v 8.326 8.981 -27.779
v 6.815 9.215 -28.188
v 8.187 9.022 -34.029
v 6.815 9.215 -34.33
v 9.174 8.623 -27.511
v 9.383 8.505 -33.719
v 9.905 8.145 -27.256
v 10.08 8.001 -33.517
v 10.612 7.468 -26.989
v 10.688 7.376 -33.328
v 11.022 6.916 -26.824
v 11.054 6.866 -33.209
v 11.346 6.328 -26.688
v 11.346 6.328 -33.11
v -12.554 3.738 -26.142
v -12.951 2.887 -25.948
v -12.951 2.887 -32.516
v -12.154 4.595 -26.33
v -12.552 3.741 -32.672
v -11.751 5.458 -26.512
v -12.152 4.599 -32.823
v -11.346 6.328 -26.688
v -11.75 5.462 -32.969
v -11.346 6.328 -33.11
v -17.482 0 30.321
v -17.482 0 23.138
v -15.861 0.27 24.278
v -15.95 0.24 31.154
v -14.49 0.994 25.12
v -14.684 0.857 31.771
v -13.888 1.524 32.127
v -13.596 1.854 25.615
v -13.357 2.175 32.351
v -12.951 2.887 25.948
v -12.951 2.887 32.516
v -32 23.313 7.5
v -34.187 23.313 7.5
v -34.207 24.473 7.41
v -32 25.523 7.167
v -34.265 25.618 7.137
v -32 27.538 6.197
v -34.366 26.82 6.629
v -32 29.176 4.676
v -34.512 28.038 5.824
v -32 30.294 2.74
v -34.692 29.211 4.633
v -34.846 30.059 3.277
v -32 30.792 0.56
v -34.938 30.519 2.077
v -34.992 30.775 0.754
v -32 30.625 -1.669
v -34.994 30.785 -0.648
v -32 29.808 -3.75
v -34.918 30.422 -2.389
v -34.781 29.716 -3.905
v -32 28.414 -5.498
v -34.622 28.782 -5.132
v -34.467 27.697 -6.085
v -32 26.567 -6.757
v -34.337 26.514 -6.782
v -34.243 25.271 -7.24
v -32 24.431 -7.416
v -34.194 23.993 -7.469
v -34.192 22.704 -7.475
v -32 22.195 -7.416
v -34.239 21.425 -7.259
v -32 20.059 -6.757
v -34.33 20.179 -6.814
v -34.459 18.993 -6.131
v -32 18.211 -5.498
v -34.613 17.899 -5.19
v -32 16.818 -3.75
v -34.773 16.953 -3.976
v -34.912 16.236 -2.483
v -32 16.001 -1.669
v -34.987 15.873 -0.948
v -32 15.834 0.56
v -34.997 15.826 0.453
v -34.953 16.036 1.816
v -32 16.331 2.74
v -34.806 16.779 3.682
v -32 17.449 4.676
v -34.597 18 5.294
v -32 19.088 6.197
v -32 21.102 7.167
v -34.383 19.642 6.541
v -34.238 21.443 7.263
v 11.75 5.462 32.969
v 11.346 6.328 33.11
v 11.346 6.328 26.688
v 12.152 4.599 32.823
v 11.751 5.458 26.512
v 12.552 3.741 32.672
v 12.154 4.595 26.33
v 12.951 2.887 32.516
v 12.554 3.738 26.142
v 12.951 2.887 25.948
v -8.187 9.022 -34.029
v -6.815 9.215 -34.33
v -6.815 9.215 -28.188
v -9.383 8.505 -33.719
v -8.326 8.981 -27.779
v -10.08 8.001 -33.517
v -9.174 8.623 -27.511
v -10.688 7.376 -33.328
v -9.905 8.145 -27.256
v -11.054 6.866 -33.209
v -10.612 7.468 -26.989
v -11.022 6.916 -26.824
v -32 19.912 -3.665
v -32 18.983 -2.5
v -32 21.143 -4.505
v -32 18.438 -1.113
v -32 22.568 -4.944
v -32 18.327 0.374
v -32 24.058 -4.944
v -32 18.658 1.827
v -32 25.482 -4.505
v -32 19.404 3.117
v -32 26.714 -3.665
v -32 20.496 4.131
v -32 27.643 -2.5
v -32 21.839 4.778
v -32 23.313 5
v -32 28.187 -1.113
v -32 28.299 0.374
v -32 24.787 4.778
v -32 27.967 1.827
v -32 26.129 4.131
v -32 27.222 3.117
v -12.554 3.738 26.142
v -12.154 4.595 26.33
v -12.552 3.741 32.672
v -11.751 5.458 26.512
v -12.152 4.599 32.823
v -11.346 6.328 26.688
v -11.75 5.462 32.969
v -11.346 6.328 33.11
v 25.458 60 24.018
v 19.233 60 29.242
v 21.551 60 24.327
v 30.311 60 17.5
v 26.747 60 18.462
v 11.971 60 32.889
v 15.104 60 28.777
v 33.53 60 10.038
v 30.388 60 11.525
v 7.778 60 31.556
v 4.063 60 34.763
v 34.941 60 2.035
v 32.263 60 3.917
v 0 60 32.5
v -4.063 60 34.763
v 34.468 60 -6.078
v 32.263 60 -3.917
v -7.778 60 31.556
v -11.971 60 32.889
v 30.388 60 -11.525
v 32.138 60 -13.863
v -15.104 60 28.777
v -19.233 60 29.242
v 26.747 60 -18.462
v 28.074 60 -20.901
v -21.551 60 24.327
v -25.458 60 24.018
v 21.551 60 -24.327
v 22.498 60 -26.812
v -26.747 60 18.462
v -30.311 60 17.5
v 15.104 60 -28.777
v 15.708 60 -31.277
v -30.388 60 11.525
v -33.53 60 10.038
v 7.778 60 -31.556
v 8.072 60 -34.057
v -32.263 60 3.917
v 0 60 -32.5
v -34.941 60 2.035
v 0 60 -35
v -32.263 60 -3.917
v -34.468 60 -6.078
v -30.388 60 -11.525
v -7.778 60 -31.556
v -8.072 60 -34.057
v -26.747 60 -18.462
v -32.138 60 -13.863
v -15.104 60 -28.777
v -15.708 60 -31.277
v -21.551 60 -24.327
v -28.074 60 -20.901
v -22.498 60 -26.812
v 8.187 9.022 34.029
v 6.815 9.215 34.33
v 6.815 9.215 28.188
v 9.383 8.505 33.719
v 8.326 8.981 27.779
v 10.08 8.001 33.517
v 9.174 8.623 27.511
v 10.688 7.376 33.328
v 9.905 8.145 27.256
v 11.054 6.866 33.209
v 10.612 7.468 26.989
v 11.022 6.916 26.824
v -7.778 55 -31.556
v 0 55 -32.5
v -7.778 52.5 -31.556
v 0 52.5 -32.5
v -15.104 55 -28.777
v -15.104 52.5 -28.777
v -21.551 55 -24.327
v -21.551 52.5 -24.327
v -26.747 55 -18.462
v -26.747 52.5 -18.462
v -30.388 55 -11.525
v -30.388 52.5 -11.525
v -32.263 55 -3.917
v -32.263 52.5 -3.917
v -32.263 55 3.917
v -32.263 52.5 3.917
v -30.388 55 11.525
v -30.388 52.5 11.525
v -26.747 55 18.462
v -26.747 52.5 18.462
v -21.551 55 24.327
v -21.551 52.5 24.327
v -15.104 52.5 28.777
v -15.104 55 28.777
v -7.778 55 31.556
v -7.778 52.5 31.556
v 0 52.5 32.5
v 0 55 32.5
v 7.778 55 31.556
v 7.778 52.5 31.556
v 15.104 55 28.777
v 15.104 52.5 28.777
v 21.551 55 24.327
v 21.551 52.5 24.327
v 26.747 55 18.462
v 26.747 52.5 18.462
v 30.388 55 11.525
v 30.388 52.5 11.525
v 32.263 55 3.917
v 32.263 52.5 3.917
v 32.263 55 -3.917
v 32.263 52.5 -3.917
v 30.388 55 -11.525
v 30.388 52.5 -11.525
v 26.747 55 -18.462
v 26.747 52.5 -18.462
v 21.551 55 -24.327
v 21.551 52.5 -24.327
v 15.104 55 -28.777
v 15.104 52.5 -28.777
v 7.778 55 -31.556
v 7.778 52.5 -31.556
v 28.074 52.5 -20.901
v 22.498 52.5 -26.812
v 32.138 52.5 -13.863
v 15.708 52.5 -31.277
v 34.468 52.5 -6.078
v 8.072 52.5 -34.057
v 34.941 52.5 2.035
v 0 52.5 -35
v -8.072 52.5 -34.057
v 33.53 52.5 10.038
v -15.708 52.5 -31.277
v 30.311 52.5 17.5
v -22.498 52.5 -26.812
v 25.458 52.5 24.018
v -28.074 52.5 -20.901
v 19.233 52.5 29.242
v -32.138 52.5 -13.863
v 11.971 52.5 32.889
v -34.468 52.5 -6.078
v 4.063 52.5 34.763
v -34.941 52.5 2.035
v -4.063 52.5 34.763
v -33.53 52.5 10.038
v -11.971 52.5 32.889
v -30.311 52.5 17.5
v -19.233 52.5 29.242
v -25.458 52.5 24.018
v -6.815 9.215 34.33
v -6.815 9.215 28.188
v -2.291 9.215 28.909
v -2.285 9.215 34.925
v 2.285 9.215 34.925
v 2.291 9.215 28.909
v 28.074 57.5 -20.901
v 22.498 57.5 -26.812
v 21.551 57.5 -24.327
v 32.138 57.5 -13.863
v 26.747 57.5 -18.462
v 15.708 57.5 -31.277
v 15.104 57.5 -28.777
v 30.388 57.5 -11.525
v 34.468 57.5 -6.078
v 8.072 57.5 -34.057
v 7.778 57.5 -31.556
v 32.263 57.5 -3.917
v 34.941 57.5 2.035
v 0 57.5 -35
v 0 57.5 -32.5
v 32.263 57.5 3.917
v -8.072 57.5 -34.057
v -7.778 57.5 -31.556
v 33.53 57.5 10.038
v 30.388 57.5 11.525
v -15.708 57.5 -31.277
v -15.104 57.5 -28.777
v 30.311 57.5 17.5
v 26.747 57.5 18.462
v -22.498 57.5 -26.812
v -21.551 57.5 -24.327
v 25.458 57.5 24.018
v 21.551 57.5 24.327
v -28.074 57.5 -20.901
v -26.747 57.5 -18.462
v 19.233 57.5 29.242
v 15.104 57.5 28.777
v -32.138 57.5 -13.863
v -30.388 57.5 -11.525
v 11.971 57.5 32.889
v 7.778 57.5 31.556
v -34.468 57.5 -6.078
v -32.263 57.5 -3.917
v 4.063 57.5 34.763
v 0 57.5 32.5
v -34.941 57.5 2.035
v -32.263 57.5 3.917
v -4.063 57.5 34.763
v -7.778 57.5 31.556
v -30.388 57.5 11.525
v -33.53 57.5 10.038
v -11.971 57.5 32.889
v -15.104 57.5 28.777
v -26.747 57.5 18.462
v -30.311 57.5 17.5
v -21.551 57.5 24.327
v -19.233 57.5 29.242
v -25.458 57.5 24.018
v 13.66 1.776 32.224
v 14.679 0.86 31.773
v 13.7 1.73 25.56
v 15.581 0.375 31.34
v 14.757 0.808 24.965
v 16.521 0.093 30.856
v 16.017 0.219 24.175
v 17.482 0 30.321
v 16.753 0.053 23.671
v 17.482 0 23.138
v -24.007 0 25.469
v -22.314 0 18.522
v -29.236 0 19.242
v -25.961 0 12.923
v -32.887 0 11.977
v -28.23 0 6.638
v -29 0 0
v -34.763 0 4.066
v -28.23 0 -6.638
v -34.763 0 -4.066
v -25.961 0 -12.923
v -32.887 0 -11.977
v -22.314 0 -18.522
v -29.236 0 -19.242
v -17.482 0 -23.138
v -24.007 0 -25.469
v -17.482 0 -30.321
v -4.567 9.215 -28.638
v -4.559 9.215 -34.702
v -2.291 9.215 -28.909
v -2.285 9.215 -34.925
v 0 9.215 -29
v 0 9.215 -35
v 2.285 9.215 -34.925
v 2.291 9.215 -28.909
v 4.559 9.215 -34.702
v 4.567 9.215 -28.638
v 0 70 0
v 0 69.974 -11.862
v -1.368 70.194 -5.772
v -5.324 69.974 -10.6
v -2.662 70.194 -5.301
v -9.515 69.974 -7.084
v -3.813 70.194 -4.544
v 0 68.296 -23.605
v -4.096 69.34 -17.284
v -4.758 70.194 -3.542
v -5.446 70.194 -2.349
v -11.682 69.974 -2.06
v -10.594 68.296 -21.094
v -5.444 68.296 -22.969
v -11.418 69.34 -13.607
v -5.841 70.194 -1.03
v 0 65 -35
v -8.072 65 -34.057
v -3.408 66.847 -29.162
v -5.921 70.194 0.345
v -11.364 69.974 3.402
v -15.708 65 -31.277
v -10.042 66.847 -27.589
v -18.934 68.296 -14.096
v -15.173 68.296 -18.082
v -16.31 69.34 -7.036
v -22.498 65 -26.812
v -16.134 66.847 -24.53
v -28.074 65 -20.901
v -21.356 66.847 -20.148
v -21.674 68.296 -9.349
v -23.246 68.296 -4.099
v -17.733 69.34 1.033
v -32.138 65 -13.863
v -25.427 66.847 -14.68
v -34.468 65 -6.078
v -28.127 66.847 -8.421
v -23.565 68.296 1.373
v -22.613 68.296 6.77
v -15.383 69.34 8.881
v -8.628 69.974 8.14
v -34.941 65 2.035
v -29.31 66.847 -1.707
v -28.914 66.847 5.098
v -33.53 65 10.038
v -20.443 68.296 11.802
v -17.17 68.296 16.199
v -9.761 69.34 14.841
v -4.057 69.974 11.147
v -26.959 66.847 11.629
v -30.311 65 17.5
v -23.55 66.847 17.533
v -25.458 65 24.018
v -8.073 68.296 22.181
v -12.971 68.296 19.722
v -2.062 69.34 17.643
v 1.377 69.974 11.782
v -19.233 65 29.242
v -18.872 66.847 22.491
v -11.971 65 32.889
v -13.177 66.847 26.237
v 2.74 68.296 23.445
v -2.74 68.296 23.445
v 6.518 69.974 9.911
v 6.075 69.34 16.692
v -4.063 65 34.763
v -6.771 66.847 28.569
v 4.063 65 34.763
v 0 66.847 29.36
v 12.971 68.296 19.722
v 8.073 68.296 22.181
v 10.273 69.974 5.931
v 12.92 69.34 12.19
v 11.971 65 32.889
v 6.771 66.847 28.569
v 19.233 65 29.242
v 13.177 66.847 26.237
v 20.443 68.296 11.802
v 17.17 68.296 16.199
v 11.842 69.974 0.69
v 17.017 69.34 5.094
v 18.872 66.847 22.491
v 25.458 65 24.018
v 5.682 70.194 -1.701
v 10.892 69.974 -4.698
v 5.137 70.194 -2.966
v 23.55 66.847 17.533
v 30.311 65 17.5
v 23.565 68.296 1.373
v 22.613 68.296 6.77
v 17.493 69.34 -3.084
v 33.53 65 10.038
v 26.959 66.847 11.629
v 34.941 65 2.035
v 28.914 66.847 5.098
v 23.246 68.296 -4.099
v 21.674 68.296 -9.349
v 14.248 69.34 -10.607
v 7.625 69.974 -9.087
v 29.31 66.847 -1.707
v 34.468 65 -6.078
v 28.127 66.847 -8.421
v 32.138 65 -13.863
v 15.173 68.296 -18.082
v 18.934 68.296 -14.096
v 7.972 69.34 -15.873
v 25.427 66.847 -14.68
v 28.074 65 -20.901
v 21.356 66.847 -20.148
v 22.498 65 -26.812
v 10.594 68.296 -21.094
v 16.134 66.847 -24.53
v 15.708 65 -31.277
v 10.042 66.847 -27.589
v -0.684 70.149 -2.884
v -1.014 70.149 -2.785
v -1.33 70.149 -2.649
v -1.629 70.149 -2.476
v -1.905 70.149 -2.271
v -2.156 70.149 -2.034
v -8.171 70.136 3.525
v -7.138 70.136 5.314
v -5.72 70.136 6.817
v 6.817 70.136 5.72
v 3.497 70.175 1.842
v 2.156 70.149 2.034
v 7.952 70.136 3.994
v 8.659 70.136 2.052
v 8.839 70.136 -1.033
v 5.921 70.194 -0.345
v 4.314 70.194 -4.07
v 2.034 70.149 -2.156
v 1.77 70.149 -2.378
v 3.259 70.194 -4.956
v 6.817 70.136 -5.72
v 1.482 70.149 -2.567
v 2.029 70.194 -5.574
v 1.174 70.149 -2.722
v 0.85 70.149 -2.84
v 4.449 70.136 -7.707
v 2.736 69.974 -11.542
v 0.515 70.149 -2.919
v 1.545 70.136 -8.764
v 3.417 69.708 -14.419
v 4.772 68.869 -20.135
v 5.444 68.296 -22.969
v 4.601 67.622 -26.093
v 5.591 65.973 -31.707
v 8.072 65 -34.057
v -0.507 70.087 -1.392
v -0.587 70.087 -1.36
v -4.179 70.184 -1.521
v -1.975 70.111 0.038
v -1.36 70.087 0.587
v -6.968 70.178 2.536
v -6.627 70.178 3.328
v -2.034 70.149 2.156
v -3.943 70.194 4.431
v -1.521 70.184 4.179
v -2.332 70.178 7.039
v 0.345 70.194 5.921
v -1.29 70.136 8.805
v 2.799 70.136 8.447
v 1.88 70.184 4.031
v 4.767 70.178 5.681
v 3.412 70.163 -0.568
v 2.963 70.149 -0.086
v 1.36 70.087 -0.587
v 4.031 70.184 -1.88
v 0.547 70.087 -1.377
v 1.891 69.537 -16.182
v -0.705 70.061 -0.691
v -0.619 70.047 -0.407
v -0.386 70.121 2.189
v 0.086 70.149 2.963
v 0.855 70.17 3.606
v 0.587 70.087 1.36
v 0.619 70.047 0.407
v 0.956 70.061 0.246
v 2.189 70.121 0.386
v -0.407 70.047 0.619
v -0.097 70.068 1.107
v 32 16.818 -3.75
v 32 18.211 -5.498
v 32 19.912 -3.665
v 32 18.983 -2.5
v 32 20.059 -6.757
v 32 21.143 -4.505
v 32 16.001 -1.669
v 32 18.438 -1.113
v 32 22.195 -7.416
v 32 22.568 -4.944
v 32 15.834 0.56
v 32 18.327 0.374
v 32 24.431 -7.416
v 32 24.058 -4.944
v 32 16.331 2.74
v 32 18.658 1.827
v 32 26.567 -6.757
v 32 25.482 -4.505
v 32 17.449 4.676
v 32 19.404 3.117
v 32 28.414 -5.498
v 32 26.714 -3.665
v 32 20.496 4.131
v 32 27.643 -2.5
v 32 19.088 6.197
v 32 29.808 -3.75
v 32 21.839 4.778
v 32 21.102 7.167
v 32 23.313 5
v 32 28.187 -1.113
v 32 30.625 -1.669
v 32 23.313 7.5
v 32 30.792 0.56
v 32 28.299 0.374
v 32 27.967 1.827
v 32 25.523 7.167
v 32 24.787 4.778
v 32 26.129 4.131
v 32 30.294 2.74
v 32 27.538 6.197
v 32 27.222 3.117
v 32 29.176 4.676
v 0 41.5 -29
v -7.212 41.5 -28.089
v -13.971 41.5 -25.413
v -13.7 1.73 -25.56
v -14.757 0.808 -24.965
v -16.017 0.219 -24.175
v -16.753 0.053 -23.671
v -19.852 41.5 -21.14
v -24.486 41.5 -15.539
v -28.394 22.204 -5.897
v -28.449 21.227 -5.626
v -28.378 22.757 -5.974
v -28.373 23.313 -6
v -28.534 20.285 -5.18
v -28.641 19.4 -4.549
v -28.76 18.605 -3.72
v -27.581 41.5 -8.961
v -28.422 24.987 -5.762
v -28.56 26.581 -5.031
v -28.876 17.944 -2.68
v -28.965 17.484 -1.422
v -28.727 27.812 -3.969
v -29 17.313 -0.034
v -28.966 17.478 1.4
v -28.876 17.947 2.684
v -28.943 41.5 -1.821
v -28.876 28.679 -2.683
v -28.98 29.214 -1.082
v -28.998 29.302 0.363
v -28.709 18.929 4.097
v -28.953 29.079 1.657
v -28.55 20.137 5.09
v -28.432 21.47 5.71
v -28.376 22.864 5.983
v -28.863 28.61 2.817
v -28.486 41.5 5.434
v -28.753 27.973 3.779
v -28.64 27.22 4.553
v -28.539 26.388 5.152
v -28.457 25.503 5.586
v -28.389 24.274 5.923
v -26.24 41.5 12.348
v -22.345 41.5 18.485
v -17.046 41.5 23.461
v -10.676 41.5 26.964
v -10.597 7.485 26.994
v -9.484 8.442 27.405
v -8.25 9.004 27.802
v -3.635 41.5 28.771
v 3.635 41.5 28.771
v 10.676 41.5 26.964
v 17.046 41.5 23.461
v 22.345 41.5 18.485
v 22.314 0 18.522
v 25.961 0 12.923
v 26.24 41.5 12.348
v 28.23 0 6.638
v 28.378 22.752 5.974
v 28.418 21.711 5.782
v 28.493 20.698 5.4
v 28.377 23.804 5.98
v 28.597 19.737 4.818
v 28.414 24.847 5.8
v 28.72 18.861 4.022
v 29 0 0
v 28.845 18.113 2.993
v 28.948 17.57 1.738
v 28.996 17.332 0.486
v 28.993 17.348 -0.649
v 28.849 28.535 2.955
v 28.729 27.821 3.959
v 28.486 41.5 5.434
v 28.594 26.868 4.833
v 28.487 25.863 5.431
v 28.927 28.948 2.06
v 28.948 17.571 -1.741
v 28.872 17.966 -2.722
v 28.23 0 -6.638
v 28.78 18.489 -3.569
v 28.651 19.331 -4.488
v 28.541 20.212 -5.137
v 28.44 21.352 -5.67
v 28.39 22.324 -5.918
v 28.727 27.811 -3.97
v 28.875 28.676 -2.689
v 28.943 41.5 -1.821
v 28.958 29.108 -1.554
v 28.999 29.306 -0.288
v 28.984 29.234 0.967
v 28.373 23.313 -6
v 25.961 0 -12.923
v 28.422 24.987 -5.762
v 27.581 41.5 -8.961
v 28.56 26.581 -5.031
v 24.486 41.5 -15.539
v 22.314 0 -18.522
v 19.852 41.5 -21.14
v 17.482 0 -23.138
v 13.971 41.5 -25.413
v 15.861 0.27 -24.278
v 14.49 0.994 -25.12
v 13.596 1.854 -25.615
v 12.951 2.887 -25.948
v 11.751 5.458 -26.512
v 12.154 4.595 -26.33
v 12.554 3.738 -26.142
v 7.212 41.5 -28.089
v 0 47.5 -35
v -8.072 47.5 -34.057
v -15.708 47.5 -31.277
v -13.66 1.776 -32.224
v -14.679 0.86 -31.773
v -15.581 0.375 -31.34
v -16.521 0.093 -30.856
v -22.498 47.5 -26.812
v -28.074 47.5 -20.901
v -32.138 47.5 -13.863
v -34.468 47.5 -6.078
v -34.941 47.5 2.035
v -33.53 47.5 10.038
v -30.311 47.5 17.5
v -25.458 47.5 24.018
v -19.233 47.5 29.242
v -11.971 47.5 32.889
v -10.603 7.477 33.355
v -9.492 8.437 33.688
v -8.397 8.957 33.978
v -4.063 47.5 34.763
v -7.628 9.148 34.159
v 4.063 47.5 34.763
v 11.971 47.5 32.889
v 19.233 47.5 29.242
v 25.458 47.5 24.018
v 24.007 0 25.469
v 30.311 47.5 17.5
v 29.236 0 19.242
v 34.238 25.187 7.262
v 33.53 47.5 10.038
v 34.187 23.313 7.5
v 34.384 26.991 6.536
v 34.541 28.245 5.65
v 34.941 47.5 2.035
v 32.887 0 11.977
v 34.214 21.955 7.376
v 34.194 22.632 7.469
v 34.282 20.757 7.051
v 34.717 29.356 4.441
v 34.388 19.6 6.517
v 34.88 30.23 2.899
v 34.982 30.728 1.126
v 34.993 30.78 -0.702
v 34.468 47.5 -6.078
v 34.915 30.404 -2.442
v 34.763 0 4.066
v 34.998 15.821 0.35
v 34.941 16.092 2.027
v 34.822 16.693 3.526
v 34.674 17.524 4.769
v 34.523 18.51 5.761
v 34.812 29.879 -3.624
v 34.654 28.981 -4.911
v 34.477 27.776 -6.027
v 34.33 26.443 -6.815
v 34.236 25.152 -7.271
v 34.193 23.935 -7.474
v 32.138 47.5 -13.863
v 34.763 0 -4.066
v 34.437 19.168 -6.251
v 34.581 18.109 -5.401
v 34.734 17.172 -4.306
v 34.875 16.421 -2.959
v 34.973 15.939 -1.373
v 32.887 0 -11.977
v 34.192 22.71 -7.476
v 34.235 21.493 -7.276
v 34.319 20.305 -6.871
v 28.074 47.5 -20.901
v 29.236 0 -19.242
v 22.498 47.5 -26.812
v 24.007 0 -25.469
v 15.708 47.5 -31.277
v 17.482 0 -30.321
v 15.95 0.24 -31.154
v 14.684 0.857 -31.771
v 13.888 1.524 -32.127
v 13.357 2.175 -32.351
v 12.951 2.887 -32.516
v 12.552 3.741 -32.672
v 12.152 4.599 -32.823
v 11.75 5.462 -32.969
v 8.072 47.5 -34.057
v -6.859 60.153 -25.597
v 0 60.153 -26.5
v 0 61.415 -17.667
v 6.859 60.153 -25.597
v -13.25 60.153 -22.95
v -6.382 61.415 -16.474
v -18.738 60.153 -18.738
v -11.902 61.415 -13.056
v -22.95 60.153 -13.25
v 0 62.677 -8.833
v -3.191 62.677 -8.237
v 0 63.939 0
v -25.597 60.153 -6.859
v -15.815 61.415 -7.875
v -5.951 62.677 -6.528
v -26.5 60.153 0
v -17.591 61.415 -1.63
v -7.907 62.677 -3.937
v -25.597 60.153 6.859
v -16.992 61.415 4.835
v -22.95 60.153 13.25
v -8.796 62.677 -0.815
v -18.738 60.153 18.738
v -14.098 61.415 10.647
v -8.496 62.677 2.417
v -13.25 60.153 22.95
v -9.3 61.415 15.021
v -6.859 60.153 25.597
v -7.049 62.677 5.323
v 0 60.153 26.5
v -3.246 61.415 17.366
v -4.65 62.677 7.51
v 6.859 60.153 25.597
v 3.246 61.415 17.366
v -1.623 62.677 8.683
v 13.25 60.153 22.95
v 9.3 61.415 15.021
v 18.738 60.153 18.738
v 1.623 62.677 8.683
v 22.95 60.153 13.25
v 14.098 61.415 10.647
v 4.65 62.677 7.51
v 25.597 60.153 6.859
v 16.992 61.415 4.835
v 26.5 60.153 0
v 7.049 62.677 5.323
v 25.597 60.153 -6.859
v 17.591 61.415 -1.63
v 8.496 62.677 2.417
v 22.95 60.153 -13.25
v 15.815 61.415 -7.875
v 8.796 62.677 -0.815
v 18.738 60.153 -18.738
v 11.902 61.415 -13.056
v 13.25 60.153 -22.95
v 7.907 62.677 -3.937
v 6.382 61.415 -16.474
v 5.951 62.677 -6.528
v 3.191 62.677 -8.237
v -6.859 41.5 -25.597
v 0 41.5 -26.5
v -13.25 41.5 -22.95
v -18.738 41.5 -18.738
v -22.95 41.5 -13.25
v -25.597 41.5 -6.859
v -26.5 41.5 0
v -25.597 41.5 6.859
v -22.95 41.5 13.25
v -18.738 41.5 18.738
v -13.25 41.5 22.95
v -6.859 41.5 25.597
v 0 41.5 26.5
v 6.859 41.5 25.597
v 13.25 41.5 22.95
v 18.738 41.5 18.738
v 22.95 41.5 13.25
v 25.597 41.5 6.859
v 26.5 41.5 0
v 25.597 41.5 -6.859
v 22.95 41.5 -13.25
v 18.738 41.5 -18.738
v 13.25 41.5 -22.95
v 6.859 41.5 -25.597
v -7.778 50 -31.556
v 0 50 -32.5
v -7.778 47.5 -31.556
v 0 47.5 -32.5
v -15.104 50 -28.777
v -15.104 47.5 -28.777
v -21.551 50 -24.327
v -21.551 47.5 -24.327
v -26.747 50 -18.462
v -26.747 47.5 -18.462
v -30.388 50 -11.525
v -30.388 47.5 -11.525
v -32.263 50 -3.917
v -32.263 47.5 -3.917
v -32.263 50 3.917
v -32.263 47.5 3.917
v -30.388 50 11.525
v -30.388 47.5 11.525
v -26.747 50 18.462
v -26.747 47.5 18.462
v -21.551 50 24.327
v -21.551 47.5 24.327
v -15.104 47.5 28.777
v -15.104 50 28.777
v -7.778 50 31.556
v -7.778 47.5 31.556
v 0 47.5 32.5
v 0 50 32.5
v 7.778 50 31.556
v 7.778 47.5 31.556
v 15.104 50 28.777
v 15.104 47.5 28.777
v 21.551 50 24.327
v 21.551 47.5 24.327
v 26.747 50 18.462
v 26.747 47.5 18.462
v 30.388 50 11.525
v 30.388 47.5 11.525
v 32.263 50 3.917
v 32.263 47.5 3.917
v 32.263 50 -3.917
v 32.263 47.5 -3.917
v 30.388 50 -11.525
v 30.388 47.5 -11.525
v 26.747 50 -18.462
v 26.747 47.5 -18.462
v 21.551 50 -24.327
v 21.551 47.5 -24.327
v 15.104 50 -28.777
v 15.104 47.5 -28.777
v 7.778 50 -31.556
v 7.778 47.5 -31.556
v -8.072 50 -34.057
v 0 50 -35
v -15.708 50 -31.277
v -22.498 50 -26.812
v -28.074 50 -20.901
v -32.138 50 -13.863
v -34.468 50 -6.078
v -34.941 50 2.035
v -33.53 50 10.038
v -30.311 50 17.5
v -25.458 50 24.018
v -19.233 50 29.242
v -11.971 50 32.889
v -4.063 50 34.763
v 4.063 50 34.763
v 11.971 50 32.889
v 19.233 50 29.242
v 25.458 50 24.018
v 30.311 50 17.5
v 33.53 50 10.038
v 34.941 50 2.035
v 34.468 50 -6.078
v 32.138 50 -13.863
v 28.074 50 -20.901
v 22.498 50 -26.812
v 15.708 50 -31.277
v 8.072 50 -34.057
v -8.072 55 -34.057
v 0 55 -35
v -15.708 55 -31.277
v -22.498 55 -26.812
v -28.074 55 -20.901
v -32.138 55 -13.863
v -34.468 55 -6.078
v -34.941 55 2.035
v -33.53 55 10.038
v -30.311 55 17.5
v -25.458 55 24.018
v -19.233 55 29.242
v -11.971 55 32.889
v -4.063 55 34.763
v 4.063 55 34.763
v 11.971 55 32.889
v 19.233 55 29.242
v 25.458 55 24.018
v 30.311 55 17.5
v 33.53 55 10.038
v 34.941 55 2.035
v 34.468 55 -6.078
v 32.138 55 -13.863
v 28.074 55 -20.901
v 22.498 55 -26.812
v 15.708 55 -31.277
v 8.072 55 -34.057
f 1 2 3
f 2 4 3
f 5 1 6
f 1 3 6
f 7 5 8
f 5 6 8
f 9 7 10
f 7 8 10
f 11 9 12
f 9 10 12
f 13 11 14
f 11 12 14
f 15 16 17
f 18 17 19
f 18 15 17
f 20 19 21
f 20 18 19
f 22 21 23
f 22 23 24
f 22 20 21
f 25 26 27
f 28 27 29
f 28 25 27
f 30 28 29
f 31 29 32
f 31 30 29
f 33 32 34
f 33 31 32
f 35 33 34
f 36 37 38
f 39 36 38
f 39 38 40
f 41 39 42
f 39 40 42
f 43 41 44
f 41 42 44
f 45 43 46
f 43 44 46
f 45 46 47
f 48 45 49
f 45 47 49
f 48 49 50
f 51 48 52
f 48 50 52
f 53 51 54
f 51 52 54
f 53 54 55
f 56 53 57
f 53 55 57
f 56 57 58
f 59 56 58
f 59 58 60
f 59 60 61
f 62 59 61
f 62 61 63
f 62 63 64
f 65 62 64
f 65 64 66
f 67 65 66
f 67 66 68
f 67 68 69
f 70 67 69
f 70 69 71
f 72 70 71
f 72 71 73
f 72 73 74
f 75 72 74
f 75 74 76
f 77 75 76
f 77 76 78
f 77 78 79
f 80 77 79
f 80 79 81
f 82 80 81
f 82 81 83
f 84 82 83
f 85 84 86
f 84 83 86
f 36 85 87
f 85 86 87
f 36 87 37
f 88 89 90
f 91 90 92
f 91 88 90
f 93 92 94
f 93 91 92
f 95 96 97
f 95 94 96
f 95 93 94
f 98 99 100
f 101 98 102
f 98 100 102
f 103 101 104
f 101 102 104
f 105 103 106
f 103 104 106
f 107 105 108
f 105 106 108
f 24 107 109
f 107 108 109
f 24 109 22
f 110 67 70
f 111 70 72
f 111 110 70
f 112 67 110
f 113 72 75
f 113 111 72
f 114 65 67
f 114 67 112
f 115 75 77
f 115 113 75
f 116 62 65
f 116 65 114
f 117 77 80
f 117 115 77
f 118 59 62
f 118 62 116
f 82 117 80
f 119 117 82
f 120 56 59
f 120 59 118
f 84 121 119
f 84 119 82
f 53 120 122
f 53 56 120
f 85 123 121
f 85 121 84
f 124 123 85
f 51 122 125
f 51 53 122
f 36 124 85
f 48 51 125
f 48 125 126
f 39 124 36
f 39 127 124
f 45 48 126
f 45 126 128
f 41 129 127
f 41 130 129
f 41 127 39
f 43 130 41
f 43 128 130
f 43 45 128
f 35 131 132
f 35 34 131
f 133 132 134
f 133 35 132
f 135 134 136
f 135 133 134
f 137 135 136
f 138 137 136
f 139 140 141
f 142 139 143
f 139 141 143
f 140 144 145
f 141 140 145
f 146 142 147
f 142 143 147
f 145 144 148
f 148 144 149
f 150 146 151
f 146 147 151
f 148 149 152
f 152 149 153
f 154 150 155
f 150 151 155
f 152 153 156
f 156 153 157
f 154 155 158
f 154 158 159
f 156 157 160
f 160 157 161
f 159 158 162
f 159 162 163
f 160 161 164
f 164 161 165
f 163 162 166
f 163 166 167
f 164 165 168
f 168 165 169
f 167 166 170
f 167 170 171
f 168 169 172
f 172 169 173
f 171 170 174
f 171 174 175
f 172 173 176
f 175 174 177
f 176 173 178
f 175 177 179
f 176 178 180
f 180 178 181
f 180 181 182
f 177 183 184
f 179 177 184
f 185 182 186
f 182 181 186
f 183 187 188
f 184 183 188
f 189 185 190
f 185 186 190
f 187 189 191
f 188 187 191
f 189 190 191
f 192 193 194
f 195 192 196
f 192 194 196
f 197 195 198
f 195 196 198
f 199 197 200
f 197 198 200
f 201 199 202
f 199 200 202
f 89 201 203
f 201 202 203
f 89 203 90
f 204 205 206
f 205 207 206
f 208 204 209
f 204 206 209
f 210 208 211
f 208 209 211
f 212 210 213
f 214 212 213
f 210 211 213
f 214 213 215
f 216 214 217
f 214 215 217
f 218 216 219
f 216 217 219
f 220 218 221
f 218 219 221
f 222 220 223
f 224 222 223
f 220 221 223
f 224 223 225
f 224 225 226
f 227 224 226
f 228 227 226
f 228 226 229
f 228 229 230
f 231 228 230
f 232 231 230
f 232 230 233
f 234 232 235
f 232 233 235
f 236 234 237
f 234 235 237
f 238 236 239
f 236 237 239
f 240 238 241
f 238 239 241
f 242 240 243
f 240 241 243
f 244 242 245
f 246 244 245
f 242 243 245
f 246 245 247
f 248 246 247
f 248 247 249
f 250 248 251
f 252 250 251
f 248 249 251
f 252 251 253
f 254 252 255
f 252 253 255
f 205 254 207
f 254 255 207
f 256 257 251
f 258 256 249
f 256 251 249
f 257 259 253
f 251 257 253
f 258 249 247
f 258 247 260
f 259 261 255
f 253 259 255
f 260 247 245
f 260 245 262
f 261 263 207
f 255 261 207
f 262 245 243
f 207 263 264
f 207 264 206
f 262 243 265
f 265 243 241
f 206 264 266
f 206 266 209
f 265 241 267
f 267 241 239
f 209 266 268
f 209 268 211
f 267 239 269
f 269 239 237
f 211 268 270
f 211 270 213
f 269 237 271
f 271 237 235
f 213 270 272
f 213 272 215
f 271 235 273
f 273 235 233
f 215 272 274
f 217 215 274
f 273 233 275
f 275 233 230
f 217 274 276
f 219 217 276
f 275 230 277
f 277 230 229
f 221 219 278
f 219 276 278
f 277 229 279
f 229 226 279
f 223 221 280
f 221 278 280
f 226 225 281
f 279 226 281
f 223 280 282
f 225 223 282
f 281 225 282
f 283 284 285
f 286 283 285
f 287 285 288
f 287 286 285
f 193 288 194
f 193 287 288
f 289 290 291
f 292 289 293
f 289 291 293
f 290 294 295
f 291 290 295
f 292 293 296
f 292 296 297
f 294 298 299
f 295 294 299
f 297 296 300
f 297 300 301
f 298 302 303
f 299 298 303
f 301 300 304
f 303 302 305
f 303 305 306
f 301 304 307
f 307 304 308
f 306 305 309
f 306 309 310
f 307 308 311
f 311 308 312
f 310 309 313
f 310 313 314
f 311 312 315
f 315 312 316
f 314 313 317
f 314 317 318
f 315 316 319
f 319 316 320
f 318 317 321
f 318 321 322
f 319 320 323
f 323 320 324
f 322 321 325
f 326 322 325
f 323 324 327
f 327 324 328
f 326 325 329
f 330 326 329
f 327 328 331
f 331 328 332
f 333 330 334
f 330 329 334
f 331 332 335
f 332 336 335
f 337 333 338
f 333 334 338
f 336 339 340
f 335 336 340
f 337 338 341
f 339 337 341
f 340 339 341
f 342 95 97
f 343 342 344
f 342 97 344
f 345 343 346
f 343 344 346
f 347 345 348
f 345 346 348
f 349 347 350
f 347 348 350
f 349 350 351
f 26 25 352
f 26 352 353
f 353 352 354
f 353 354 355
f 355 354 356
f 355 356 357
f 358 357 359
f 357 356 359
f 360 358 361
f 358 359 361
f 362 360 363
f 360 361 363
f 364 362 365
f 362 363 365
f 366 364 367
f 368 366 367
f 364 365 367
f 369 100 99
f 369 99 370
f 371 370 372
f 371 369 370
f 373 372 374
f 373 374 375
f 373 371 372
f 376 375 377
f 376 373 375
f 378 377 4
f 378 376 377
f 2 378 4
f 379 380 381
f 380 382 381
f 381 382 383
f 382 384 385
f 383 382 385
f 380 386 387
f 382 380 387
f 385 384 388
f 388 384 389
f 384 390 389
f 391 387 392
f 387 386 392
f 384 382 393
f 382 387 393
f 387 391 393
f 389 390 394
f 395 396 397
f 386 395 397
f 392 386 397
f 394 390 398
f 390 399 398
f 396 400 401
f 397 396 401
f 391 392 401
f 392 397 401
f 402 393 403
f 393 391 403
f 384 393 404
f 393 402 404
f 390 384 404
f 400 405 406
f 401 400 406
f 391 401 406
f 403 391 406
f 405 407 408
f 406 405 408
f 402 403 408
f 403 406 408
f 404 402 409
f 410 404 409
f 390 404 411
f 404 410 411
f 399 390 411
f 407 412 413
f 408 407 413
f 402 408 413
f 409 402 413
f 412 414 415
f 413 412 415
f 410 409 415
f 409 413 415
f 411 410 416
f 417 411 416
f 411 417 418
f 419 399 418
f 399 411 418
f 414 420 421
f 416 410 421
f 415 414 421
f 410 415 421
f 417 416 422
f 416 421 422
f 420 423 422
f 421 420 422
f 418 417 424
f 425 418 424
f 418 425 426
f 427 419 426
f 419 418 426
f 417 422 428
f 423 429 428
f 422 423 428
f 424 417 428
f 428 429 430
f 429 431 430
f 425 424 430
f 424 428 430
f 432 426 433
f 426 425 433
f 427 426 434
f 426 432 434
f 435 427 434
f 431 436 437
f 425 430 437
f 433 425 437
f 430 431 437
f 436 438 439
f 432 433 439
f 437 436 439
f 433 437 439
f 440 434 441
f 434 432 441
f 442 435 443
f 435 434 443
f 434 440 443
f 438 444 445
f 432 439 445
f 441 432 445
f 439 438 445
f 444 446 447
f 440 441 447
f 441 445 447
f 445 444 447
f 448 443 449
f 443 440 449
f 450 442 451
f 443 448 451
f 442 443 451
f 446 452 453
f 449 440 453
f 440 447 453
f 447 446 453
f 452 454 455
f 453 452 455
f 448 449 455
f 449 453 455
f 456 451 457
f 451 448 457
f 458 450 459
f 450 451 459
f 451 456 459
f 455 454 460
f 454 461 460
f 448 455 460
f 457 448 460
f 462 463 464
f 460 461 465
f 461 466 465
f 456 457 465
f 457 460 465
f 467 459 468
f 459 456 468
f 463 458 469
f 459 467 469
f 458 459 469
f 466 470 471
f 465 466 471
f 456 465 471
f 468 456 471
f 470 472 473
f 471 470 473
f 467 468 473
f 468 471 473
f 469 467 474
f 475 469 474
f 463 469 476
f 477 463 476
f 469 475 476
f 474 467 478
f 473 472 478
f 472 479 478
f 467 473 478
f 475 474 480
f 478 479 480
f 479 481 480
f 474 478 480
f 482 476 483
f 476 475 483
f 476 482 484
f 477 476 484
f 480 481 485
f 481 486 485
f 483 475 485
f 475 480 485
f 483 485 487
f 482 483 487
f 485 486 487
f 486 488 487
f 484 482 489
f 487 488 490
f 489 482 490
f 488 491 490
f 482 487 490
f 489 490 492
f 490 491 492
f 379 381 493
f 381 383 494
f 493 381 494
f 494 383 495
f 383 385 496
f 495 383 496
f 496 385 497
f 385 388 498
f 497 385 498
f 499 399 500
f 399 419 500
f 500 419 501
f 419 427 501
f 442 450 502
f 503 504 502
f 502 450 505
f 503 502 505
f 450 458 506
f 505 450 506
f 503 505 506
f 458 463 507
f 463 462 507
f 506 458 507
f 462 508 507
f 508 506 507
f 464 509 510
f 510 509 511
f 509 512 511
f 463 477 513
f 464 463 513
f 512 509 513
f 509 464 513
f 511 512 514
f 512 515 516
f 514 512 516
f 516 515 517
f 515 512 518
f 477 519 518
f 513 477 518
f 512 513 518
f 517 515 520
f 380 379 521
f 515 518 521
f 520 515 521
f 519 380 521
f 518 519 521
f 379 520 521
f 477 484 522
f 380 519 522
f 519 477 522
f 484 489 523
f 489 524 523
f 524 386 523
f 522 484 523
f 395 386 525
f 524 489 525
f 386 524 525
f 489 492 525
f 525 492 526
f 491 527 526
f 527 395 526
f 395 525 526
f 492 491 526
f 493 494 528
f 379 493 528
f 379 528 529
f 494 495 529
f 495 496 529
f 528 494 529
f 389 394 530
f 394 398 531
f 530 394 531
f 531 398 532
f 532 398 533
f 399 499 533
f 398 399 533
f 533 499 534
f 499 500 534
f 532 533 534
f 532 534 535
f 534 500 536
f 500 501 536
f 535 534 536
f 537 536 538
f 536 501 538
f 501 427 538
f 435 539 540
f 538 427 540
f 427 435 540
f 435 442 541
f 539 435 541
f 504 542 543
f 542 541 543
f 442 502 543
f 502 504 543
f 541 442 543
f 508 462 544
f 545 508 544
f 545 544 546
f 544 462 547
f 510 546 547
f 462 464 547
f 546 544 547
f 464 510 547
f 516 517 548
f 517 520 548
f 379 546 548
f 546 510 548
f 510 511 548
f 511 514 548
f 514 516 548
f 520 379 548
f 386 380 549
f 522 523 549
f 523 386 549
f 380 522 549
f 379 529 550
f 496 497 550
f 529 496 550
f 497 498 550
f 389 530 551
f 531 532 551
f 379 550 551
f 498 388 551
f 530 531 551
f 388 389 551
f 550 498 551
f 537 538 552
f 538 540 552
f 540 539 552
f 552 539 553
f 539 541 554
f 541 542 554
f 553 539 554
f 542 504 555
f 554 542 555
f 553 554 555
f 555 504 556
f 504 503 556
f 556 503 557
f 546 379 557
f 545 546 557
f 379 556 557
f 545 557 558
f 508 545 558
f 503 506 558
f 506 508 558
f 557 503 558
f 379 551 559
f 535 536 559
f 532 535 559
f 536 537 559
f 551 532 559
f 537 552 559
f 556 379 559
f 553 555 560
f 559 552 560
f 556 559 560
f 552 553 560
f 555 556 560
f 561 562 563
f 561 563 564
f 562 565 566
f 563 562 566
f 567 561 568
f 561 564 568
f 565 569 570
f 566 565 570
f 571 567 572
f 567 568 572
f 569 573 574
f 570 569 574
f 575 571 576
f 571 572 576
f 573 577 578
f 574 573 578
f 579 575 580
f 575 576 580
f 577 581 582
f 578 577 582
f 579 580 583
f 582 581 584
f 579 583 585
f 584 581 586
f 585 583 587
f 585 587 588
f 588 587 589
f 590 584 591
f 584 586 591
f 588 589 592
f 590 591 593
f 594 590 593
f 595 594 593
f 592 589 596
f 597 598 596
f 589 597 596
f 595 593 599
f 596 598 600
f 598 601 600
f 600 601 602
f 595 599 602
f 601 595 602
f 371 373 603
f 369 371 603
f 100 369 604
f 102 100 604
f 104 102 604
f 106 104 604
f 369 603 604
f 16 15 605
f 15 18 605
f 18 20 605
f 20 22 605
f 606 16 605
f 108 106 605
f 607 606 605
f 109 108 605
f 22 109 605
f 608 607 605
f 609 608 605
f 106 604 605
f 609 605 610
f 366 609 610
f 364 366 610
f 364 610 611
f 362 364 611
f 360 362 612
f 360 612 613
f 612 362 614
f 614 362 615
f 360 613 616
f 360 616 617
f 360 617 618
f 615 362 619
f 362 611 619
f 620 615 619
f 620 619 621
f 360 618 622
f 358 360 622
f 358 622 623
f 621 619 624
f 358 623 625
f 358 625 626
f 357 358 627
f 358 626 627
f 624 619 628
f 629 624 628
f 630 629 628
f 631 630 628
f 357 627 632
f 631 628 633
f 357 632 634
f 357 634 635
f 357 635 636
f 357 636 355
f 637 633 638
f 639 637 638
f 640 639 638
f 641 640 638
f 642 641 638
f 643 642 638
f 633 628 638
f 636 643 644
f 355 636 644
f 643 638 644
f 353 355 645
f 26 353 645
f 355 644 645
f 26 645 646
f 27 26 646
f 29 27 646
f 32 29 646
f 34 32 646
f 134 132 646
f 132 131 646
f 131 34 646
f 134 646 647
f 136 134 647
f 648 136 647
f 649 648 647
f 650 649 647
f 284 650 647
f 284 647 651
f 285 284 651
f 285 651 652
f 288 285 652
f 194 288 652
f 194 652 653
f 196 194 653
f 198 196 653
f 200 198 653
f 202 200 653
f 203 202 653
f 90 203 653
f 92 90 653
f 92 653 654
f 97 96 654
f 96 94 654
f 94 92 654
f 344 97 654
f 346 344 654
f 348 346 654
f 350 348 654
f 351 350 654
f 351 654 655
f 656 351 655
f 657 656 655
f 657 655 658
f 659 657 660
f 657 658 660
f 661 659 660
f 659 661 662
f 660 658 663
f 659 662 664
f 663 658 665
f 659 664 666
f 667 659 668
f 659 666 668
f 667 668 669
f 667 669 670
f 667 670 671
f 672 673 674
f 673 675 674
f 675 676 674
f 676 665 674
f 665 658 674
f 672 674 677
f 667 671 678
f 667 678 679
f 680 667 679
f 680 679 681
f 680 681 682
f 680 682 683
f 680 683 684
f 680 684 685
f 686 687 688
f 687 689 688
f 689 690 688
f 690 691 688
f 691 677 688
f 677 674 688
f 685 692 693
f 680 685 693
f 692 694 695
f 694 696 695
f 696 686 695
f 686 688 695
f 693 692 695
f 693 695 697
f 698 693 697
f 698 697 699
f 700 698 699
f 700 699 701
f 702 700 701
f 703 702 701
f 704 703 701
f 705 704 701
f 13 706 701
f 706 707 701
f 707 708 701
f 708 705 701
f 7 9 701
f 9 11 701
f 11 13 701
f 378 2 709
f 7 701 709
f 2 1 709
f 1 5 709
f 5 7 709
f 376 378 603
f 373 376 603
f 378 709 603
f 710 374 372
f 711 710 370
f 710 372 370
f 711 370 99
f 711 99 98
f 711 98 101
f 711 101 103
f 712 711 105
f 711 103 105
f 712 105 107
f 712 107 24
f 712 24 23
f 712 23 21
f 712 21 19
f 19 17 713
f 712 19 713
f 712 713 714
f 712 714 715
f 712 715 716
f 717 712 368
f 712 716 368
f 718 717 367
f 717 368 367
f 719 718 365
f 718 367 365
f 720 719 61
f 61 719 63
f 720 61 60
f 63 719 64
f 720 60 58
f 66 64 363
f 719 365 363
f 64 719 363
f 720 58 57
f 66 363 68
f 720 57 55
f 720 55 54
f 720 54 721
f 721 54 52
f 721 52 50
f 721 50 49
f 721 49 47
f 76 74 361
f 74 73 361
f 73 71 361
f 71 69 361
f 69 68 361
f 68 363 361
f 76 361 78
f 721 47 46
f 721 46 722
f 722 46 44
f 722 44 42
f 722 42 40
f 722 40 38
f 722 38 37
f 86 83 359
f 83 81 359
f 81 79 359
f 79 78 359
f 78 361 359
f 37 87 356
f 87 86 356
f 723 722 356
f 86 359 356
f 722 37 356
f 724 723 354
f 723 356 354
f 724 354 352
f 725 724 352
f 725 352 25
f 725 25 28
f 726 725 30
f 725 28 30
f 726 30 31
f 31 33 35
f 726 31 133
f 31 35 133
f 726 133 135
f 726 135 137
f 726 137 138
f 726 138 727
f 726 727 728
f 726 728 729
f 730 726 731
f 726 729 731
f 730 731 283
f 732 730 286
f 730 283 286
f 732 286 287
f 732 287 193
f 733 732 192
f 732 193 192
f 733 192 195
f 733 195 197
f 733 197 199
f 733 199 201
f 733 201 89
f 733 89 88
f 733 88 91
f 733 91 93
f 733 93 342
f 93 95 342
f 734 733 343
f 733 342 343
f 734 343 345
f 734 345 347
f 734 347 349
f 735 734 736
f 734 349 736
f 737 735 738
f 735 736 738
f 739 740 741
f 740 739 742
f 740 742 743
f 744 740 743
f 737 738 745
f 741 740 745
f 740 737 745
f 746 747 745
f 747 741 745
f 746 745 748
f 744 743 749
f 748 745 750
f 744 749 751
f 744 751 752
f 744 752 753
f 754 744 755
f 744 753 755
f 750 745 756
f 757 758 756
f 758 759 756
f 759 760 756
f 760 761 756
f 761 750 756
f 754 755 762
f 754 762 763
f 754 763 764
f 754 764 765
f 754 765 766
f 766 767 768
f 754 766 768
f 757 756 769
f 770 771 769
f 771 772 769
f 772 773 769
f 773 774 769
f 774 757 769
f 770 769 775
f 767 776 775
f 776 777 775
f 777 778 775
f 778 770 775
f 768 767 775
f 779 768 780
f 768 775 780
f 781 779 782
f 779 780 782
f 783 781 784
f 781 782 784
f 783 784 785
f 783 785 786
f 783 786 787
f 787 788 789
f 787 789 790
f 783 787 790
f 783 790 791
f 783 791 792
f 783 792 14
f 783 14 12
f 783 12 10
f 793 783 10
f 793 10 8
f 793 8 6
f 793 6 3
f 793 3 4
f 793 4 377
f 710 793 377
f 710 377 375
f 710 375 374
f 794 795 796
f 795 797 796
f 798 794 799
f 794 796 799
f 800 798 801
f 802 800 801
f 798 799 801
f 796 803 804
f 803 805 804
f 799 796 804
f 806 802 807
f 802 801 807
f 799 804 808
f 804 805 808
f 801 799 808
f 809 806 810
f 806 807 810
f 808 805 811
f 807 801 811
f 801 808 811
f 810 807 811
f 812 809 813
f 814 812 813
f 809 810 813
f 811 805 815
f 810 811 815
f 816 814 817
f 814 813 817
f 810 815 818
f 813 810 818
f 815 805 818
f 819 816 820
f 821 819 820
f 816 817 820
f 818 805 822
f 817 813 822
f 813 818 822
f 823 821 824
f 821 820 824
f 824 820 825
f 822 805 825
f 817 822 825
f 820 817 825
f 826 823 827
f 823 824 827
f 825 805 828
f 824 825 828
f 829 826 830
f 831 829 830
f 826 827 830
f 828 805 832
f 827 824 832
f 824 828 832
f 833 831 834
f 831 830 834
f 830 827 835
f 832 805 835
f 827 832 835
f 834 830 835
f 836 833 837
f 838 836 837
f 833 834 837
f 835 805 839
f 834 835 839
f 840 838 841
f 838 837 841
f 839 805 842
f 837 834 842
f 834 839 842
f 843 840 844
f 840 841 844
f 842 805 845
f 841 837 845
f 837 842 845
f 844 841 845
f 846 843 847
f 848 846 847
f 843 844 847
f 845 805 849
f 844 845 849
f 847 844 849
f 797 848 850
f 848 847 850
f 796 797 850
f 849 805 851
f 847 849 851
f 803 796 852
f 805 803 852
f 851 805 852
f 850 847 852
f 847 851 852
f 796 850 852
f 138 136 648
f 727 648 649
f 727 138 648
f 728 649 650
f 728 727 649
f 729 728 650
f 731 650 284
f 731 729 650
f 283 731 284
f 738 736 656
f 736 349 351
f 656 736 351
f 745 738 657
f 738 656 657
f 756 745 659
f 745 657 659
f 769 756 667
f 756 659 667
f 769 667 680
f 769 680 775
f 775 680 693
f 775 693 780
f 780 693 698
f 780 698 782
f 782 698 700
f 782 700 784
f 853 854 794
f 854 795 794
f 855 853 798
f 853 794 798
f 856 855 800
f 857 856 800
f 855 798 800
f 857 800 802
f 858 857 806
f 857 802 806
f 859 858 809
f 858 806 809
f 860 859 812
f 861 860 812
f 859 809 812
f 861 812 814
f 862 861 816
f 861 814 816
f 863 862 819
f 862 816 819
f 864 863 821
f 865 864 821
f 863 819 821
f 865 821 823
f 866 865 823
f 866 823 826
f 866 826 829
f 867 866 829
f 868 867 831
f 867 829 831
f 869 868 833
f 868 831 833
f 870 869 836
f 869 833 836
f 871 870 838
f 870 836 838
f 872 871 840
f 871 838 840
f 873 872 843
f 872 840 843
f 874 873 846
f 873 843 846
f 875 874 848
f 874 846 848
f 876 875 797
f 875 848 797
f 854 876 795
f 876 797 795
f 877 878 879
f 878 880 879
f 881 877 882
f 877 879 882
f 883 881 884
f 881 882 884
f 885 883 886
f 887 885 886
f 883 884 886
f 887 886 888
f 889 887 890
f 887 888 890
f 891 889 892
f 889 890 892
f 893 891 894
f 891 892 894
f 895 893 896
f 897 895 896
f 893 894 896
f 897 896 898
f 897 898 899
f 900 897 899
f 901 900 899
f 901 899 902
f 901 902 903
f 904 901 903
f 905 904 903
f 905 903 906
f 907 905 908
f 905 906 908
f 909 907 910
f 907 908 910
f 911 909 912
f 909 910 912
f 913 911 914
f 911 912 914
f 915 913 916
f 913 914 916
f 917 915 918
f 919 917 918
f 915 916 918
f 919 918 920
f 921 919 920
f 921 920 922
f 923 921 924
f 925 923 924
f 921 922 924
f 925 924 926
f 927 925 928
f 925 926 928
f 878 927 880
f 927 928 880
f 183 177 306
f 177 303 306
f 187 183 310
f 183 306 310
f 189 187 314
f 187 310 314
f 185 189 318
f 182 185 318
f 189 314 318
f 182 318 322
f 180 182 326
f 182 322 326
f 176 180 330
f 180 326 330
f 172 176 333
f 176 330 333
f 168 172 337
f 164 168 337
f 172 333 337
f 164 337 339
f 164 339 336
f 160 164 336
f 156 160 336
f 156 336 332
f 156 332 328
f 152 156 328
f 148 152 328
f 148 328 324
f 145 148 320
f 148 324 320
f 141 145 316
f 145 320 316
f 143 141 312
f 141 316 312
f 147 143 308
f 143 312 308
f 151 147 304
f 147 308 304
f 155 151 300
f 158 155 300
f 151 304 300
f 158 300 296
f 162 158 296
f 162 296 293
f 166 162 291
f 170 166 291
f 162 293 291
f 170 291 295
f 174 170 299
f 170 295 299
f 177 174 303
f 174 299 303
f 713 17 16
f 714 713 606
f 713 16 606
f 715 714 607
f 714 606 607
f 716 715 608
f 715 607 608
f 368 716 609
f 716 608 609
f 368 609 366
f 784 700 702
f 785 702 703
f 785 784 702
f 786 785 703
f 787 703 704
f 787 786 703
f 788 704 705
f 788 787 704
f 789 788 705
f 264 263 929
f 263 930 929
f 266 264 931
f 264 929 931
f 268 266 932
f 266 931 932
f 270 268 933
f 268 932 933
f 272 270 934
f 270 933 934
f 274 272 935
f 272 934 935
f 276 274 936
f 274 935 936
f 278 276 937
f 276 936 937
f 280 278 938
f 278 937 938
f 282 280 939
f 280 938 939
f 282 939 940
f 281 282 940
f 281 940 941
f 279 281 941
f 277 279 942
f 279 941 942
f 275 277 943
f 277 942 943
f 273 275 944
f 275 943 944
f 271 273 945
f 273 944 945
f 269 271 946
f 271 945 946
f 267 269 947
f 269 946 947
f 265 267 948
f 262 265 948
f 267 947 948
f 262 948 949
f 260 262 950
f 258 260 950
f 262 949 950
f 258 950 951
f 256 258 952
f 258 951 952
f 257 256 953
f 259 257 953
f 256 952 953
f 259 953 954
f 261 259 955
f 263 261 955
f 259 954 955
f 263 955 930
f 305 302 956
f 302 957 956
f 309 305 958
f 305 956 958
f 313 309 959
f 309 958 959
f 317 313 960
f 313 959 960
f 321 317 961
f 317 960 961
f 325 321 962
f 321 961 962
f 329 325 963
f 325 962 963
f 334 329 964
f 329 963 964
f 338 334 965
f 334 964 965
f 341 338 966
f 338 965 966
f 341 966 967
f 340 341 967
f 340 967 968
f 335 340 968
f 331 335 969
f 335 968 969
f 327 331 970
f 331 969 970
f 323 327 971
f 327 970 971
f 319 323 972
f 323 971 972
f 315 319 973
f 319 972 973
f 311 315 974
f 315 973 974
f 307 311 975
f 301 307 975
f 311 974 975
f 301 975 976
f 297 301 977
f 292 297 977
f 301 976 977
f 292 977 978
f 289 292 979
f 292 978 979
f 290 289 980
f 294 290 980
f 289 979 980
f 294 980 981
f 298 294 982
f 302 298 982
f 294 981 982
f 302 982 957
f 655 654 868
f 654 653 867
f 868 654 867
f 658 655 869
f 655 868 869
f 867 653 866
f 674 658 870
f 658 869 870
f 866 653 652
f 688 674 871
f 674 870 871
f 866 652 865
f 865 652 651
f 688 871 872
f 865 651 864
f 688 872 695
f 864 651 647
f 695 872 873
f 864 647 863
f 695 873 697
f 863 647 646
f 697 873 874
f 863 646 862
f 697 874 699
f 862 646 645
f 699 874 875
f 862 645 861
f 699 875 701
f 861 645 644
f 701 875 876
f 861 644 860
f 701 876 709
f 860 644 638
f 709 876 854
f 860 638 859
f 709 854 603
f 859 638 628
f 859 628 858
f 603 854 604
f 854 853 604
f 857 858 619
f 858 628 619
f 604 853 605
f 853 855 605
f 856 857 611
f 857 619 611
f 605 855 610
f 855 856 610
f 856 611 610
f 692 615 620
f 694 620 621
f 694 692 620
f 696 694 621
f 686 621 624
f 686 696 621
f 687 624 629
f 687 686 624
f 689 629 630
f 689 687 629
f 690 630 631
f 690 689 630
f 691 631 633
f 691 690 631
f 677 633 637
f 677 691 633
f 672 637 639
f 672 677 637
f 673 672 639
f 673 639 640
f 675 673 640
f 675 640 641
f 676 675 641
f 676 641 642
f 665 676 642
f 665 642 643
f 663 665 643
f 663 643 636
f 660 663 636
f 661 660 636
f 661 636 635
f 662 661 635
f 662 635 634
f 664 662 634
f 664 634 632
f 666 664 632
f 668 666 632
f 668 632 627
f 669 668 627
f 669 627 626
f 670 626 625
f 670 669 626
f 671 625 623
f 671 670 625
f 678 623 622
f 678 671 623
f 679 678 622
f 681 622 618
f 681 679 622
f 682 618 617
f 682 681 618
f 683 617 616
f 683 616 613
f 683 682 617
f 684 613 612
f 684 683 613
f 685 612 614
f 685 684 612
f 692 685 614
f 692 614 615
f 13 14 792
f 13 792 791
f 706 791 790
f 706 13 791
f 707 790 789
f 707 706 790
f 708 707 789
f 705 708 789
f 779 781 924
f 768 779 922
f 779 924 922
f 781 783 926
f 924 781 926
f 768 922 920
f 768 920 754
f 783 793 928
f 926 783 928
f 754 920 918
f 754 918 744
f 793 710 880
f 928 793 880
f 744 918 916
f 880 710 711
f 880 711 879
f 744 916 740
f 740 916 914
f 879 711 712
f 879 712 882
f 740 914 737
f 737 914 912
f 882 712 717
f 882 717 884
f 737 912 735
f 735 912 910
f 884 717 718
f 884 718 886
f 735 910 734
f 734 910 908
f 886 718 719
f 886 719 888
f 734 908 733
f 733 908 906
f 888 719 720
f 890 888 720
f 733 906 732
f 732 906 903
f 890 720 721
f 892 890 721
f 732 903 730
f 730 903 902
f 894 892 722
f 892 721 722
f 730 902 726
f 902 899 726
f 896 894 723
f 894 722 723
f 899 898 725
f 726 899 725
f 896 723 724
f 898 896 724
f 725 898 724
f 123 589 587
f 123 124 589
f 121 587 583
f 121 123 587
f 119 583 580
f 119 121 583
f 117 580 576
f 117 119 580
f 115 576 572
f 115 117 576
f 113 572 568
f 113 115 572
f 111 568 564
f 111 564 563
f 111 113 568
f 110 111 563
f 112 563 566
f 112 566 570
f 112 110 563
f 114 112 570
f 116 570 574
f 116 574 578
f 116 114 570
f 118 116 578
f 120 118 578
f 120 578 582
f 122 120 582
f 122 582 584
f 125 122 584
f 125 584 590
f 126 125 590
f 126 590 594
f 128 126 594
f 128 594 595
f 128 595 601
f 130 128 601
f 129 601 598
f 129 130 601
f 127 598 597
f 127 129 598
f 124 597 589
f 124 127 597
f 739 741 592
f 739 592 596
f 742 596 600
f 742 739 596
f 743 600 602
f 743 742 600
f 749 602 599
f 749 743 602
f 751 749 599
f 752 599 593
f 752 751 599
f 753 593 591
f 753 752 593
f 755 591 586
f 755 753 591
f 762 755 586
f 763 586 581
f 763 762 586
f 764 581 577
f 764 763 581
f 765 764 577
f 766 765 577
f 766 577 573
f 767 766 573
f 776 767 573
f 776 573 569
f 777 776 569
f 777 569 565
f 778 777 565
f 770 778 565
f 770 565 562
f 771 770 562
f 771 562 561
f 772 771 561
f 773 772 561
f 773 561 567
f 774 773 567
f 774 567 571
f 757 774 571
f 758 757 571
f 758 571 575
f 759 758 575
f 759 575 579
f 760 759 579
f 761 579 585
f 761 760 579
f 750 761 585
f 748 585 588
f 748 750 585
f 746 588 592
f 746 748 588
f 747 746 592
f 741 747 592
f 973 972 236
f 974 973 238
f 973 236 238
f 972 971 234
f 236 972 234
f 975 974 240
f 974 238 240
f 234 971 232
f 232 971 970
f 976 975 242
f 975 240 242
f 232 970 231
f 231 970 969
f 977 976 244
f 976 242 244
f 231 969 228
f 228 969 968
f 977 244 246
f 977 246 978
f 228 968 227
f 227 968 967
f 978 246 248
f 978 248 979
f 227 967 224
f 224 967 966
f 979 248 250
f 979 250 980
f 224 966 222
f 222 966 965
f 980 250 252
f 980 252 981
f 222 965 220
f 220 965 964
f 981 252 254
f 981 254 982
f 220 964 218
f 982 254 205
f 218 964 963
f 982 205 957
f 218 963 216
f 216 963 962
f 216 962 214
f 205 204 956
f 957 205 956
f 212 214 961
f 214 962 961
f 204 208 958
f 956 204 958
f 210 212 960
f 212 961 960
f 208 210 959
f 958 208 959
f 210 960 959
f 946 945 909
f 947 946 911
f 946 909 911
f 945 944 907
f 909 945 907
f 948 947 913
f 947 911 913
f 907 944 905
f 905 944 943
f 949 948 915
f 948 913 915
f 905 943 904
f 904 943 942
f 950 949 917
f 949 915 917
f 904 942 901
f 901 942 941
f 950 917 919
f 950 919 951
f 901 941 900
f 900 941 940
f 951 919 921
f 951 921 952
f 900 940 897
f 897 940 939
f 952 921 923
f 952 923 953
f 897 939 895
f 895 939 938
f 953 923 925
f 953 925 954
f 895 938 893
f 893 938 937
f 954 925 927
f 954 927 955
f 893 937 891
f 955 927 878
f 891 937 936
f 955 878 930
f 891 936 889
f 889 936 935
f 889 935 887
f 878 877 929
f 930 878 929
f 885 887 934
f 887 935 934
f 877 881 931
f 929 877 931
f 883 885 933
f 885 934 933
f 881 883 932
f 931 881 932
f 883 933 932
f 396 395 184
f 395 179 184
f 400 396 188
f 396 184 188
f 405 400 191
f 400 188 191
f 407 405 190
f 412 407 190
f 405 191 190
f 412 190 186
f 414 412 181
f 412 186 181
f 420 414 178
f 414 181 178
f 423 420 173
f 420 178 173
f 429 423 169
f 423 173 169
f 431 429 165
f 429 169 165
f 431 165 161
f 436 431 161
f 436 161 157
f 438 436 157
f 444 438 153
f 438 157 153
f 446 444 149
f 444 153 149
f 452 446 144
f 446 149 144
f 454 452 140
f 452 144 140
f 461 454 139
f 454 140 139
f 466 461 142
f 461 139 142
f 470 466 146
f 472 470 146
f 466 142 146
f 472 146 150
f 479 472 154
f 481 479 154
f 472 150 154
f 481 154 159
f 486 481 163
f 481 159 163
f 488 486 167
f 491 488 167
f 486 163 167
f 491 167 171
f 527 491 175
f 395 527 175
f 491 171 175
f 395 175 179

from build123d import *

# Parameters (mm, degrees)
CUT_EXTRUDE1_DEPTH  = 50
FILLET1_R           = 5
SKETCH4_R           = 7.5
CUT_EXTRUDE2_DEPTH  = 3
SKETCH6_R           = 5
CUT_EXTRUDE3_DEPTH  = 21
SKETCH7_R           = 6
BOSS_EXTRUDE1_DEPTH = 62
CUT_EXTRUDE4_START  = -100
SKETCH8_R           = 5
CUT_EXTRUDE4_DEPTH  = 100


with BuildPart() as part:
    # Sketch1 → Revolve1 (revolve)
    with BuildSketch(Plane.XY, mode=Mode.PRIVATE) as revolve1_sk:
        with BuildLine():
            Line((35, 65), (35, 60))
            Line((35, 60), (32.5, 60))
            Line((32.5, 60), (32.5, 57.5))
            Line((32.5, 57.5), (35, 57.5))
            Line((35, 57.5), (35, 55))
            Line((35, 55), (32.5, 55))
            Line((32.5, 55), (32.5, 52.5))
            Line((32.5, 52.5), (35, 52.5))
            Line((35, 52.5), (35, 50))
            Line((35, 50), (32.5, 50))
            Line((32.5, 50), (32.5, 47.5))
            Line((32.5, 47.5), (35, 47.5))
            Line((35, 47.5), (35, 0))
            Line((35, 0), (29, 0))
            Line((29, 0), (29, 41.5))
            Line((29, 41.5), (26.5, 41.5))
            Line((26.5, 41.5), (26.5, 51.25))
            Line((26.5, 51.25), (26.5, 56.25))
            Line((26.5, 56.25), (26.5, 60.153370447))
            Line((26.5, 60.153370447), (0, 63.939084733))
            Line((0, 63.939084733), (0, 70))
            ThreePointArc((0, 70), (17.762839264, 69.339874847), (35, 65))
        make_face()
    revolve(revolve1_sk.sketch.rotate(Axis((0, 0, 0), (0, 1, 0)), 90), axis=Axis((0, 0, 0), (0, 1, 0)))

    # Sketch2 → Cut-Extrude1 (cut, symmetric)
    with BuildSketch(Plane.XY):
        Polygon((-10, 9.214548861), (10, 9.214548861), (14.296814701, 0), (14.296814701, -4.920765988), (0.577416947, -4.920765988), (-8.331342859, -4.920765988), (-14.2968147, 0), align=None)
    extrude(amount=CUT_EXTRUDE1_DEPTH, both=True, mode=Mode.SUBTRACT)

    # Fillet1
    fillet1_edges = [part.edges().sort_by_distance(p)[0] for p in [
        (14.296814701, 0, -28.588901432),
        (14.296814701, 0, 28.588901432),
        (10, 9.214548861, 30.38116742),
        (10, 9.214548861, -30.38116742),
        (-14.2968147, 0, 28.588901432),
        (-14.2968147, 0, -28.588901432),
        (-10, 9.214548861, 30.38116742),
        (-10, 9.214548861, -30.38116742),
    ]]
    fillet(fillet1_edges, radius=FILLET1_R)

    # Sketch4 → Cut-Extrude2 (cut)
    with BuildSketch(Plane.ZY.offset(35)):
        with Locations((0, 23.312730986)):
            Circle(SKETCH4_R)
    cut_extrude2 = extrude(amount=-CUT_EXTRUDE2_DEPTH, mode=Mode.SUBTRACT)

    # Sketch6 → Cut-Extrude3 (cut)
    with BuildSketch(Plane.ZY.offset(32)):
        with Locations((0, 23.312730986)):
            Circle(SKETCH6_R)
    cut_extrude3 = extrude(amount=-CUT_EXTRUDE3_DEPTH, mode=Mode.SUBTRACT)

    # Mirror1: Cut-Extrude2, Cut-Extrude3 across plane
    add(cut_extrude2.mirror(Plane(origin=(0, 0, 0), x_dir=(0, 0, 1), z_dir=(1, 0, 0))), mode=Mode.SUBTRACT)
    add(cut_extrude3.mirror(Plane(origin=(0, 0, 0), x_dir=(0, 0, 1), z_dir=(1, 0, 0))), mode=Mode.SUBTRACT)

    # Sketch7 → Boss-Extrude1 (add)
    with BuildSketch(Plane(origin=(32, 0, 0), x_dir=(0, 0, -1), z_dir=(1, 0, 0))):
        with Locations((0, 23.312730986)):
            Circle(SKETCH7_R)
    extrude(amount=-BOSS_EXTRUDE1_DEPTH)

    # Sketch8 → Cut-Extrude4 (cut)
    with BuildSketch(Plane(origin=(32, 0, 0), x_dir=(0, 0, -1), z_dir=(1, 0, 0)).offset(CUT_EXTRUDE4_START)):
        with Locations(Location((0, 23.312730986, 0), (0, 0, 180))):
            Circle(SKETCH8_R)
    extrude(amount=CUT_EXTRUDE4_DEPTH, mode=Mode.SUBTRACT)


solid = part.part
